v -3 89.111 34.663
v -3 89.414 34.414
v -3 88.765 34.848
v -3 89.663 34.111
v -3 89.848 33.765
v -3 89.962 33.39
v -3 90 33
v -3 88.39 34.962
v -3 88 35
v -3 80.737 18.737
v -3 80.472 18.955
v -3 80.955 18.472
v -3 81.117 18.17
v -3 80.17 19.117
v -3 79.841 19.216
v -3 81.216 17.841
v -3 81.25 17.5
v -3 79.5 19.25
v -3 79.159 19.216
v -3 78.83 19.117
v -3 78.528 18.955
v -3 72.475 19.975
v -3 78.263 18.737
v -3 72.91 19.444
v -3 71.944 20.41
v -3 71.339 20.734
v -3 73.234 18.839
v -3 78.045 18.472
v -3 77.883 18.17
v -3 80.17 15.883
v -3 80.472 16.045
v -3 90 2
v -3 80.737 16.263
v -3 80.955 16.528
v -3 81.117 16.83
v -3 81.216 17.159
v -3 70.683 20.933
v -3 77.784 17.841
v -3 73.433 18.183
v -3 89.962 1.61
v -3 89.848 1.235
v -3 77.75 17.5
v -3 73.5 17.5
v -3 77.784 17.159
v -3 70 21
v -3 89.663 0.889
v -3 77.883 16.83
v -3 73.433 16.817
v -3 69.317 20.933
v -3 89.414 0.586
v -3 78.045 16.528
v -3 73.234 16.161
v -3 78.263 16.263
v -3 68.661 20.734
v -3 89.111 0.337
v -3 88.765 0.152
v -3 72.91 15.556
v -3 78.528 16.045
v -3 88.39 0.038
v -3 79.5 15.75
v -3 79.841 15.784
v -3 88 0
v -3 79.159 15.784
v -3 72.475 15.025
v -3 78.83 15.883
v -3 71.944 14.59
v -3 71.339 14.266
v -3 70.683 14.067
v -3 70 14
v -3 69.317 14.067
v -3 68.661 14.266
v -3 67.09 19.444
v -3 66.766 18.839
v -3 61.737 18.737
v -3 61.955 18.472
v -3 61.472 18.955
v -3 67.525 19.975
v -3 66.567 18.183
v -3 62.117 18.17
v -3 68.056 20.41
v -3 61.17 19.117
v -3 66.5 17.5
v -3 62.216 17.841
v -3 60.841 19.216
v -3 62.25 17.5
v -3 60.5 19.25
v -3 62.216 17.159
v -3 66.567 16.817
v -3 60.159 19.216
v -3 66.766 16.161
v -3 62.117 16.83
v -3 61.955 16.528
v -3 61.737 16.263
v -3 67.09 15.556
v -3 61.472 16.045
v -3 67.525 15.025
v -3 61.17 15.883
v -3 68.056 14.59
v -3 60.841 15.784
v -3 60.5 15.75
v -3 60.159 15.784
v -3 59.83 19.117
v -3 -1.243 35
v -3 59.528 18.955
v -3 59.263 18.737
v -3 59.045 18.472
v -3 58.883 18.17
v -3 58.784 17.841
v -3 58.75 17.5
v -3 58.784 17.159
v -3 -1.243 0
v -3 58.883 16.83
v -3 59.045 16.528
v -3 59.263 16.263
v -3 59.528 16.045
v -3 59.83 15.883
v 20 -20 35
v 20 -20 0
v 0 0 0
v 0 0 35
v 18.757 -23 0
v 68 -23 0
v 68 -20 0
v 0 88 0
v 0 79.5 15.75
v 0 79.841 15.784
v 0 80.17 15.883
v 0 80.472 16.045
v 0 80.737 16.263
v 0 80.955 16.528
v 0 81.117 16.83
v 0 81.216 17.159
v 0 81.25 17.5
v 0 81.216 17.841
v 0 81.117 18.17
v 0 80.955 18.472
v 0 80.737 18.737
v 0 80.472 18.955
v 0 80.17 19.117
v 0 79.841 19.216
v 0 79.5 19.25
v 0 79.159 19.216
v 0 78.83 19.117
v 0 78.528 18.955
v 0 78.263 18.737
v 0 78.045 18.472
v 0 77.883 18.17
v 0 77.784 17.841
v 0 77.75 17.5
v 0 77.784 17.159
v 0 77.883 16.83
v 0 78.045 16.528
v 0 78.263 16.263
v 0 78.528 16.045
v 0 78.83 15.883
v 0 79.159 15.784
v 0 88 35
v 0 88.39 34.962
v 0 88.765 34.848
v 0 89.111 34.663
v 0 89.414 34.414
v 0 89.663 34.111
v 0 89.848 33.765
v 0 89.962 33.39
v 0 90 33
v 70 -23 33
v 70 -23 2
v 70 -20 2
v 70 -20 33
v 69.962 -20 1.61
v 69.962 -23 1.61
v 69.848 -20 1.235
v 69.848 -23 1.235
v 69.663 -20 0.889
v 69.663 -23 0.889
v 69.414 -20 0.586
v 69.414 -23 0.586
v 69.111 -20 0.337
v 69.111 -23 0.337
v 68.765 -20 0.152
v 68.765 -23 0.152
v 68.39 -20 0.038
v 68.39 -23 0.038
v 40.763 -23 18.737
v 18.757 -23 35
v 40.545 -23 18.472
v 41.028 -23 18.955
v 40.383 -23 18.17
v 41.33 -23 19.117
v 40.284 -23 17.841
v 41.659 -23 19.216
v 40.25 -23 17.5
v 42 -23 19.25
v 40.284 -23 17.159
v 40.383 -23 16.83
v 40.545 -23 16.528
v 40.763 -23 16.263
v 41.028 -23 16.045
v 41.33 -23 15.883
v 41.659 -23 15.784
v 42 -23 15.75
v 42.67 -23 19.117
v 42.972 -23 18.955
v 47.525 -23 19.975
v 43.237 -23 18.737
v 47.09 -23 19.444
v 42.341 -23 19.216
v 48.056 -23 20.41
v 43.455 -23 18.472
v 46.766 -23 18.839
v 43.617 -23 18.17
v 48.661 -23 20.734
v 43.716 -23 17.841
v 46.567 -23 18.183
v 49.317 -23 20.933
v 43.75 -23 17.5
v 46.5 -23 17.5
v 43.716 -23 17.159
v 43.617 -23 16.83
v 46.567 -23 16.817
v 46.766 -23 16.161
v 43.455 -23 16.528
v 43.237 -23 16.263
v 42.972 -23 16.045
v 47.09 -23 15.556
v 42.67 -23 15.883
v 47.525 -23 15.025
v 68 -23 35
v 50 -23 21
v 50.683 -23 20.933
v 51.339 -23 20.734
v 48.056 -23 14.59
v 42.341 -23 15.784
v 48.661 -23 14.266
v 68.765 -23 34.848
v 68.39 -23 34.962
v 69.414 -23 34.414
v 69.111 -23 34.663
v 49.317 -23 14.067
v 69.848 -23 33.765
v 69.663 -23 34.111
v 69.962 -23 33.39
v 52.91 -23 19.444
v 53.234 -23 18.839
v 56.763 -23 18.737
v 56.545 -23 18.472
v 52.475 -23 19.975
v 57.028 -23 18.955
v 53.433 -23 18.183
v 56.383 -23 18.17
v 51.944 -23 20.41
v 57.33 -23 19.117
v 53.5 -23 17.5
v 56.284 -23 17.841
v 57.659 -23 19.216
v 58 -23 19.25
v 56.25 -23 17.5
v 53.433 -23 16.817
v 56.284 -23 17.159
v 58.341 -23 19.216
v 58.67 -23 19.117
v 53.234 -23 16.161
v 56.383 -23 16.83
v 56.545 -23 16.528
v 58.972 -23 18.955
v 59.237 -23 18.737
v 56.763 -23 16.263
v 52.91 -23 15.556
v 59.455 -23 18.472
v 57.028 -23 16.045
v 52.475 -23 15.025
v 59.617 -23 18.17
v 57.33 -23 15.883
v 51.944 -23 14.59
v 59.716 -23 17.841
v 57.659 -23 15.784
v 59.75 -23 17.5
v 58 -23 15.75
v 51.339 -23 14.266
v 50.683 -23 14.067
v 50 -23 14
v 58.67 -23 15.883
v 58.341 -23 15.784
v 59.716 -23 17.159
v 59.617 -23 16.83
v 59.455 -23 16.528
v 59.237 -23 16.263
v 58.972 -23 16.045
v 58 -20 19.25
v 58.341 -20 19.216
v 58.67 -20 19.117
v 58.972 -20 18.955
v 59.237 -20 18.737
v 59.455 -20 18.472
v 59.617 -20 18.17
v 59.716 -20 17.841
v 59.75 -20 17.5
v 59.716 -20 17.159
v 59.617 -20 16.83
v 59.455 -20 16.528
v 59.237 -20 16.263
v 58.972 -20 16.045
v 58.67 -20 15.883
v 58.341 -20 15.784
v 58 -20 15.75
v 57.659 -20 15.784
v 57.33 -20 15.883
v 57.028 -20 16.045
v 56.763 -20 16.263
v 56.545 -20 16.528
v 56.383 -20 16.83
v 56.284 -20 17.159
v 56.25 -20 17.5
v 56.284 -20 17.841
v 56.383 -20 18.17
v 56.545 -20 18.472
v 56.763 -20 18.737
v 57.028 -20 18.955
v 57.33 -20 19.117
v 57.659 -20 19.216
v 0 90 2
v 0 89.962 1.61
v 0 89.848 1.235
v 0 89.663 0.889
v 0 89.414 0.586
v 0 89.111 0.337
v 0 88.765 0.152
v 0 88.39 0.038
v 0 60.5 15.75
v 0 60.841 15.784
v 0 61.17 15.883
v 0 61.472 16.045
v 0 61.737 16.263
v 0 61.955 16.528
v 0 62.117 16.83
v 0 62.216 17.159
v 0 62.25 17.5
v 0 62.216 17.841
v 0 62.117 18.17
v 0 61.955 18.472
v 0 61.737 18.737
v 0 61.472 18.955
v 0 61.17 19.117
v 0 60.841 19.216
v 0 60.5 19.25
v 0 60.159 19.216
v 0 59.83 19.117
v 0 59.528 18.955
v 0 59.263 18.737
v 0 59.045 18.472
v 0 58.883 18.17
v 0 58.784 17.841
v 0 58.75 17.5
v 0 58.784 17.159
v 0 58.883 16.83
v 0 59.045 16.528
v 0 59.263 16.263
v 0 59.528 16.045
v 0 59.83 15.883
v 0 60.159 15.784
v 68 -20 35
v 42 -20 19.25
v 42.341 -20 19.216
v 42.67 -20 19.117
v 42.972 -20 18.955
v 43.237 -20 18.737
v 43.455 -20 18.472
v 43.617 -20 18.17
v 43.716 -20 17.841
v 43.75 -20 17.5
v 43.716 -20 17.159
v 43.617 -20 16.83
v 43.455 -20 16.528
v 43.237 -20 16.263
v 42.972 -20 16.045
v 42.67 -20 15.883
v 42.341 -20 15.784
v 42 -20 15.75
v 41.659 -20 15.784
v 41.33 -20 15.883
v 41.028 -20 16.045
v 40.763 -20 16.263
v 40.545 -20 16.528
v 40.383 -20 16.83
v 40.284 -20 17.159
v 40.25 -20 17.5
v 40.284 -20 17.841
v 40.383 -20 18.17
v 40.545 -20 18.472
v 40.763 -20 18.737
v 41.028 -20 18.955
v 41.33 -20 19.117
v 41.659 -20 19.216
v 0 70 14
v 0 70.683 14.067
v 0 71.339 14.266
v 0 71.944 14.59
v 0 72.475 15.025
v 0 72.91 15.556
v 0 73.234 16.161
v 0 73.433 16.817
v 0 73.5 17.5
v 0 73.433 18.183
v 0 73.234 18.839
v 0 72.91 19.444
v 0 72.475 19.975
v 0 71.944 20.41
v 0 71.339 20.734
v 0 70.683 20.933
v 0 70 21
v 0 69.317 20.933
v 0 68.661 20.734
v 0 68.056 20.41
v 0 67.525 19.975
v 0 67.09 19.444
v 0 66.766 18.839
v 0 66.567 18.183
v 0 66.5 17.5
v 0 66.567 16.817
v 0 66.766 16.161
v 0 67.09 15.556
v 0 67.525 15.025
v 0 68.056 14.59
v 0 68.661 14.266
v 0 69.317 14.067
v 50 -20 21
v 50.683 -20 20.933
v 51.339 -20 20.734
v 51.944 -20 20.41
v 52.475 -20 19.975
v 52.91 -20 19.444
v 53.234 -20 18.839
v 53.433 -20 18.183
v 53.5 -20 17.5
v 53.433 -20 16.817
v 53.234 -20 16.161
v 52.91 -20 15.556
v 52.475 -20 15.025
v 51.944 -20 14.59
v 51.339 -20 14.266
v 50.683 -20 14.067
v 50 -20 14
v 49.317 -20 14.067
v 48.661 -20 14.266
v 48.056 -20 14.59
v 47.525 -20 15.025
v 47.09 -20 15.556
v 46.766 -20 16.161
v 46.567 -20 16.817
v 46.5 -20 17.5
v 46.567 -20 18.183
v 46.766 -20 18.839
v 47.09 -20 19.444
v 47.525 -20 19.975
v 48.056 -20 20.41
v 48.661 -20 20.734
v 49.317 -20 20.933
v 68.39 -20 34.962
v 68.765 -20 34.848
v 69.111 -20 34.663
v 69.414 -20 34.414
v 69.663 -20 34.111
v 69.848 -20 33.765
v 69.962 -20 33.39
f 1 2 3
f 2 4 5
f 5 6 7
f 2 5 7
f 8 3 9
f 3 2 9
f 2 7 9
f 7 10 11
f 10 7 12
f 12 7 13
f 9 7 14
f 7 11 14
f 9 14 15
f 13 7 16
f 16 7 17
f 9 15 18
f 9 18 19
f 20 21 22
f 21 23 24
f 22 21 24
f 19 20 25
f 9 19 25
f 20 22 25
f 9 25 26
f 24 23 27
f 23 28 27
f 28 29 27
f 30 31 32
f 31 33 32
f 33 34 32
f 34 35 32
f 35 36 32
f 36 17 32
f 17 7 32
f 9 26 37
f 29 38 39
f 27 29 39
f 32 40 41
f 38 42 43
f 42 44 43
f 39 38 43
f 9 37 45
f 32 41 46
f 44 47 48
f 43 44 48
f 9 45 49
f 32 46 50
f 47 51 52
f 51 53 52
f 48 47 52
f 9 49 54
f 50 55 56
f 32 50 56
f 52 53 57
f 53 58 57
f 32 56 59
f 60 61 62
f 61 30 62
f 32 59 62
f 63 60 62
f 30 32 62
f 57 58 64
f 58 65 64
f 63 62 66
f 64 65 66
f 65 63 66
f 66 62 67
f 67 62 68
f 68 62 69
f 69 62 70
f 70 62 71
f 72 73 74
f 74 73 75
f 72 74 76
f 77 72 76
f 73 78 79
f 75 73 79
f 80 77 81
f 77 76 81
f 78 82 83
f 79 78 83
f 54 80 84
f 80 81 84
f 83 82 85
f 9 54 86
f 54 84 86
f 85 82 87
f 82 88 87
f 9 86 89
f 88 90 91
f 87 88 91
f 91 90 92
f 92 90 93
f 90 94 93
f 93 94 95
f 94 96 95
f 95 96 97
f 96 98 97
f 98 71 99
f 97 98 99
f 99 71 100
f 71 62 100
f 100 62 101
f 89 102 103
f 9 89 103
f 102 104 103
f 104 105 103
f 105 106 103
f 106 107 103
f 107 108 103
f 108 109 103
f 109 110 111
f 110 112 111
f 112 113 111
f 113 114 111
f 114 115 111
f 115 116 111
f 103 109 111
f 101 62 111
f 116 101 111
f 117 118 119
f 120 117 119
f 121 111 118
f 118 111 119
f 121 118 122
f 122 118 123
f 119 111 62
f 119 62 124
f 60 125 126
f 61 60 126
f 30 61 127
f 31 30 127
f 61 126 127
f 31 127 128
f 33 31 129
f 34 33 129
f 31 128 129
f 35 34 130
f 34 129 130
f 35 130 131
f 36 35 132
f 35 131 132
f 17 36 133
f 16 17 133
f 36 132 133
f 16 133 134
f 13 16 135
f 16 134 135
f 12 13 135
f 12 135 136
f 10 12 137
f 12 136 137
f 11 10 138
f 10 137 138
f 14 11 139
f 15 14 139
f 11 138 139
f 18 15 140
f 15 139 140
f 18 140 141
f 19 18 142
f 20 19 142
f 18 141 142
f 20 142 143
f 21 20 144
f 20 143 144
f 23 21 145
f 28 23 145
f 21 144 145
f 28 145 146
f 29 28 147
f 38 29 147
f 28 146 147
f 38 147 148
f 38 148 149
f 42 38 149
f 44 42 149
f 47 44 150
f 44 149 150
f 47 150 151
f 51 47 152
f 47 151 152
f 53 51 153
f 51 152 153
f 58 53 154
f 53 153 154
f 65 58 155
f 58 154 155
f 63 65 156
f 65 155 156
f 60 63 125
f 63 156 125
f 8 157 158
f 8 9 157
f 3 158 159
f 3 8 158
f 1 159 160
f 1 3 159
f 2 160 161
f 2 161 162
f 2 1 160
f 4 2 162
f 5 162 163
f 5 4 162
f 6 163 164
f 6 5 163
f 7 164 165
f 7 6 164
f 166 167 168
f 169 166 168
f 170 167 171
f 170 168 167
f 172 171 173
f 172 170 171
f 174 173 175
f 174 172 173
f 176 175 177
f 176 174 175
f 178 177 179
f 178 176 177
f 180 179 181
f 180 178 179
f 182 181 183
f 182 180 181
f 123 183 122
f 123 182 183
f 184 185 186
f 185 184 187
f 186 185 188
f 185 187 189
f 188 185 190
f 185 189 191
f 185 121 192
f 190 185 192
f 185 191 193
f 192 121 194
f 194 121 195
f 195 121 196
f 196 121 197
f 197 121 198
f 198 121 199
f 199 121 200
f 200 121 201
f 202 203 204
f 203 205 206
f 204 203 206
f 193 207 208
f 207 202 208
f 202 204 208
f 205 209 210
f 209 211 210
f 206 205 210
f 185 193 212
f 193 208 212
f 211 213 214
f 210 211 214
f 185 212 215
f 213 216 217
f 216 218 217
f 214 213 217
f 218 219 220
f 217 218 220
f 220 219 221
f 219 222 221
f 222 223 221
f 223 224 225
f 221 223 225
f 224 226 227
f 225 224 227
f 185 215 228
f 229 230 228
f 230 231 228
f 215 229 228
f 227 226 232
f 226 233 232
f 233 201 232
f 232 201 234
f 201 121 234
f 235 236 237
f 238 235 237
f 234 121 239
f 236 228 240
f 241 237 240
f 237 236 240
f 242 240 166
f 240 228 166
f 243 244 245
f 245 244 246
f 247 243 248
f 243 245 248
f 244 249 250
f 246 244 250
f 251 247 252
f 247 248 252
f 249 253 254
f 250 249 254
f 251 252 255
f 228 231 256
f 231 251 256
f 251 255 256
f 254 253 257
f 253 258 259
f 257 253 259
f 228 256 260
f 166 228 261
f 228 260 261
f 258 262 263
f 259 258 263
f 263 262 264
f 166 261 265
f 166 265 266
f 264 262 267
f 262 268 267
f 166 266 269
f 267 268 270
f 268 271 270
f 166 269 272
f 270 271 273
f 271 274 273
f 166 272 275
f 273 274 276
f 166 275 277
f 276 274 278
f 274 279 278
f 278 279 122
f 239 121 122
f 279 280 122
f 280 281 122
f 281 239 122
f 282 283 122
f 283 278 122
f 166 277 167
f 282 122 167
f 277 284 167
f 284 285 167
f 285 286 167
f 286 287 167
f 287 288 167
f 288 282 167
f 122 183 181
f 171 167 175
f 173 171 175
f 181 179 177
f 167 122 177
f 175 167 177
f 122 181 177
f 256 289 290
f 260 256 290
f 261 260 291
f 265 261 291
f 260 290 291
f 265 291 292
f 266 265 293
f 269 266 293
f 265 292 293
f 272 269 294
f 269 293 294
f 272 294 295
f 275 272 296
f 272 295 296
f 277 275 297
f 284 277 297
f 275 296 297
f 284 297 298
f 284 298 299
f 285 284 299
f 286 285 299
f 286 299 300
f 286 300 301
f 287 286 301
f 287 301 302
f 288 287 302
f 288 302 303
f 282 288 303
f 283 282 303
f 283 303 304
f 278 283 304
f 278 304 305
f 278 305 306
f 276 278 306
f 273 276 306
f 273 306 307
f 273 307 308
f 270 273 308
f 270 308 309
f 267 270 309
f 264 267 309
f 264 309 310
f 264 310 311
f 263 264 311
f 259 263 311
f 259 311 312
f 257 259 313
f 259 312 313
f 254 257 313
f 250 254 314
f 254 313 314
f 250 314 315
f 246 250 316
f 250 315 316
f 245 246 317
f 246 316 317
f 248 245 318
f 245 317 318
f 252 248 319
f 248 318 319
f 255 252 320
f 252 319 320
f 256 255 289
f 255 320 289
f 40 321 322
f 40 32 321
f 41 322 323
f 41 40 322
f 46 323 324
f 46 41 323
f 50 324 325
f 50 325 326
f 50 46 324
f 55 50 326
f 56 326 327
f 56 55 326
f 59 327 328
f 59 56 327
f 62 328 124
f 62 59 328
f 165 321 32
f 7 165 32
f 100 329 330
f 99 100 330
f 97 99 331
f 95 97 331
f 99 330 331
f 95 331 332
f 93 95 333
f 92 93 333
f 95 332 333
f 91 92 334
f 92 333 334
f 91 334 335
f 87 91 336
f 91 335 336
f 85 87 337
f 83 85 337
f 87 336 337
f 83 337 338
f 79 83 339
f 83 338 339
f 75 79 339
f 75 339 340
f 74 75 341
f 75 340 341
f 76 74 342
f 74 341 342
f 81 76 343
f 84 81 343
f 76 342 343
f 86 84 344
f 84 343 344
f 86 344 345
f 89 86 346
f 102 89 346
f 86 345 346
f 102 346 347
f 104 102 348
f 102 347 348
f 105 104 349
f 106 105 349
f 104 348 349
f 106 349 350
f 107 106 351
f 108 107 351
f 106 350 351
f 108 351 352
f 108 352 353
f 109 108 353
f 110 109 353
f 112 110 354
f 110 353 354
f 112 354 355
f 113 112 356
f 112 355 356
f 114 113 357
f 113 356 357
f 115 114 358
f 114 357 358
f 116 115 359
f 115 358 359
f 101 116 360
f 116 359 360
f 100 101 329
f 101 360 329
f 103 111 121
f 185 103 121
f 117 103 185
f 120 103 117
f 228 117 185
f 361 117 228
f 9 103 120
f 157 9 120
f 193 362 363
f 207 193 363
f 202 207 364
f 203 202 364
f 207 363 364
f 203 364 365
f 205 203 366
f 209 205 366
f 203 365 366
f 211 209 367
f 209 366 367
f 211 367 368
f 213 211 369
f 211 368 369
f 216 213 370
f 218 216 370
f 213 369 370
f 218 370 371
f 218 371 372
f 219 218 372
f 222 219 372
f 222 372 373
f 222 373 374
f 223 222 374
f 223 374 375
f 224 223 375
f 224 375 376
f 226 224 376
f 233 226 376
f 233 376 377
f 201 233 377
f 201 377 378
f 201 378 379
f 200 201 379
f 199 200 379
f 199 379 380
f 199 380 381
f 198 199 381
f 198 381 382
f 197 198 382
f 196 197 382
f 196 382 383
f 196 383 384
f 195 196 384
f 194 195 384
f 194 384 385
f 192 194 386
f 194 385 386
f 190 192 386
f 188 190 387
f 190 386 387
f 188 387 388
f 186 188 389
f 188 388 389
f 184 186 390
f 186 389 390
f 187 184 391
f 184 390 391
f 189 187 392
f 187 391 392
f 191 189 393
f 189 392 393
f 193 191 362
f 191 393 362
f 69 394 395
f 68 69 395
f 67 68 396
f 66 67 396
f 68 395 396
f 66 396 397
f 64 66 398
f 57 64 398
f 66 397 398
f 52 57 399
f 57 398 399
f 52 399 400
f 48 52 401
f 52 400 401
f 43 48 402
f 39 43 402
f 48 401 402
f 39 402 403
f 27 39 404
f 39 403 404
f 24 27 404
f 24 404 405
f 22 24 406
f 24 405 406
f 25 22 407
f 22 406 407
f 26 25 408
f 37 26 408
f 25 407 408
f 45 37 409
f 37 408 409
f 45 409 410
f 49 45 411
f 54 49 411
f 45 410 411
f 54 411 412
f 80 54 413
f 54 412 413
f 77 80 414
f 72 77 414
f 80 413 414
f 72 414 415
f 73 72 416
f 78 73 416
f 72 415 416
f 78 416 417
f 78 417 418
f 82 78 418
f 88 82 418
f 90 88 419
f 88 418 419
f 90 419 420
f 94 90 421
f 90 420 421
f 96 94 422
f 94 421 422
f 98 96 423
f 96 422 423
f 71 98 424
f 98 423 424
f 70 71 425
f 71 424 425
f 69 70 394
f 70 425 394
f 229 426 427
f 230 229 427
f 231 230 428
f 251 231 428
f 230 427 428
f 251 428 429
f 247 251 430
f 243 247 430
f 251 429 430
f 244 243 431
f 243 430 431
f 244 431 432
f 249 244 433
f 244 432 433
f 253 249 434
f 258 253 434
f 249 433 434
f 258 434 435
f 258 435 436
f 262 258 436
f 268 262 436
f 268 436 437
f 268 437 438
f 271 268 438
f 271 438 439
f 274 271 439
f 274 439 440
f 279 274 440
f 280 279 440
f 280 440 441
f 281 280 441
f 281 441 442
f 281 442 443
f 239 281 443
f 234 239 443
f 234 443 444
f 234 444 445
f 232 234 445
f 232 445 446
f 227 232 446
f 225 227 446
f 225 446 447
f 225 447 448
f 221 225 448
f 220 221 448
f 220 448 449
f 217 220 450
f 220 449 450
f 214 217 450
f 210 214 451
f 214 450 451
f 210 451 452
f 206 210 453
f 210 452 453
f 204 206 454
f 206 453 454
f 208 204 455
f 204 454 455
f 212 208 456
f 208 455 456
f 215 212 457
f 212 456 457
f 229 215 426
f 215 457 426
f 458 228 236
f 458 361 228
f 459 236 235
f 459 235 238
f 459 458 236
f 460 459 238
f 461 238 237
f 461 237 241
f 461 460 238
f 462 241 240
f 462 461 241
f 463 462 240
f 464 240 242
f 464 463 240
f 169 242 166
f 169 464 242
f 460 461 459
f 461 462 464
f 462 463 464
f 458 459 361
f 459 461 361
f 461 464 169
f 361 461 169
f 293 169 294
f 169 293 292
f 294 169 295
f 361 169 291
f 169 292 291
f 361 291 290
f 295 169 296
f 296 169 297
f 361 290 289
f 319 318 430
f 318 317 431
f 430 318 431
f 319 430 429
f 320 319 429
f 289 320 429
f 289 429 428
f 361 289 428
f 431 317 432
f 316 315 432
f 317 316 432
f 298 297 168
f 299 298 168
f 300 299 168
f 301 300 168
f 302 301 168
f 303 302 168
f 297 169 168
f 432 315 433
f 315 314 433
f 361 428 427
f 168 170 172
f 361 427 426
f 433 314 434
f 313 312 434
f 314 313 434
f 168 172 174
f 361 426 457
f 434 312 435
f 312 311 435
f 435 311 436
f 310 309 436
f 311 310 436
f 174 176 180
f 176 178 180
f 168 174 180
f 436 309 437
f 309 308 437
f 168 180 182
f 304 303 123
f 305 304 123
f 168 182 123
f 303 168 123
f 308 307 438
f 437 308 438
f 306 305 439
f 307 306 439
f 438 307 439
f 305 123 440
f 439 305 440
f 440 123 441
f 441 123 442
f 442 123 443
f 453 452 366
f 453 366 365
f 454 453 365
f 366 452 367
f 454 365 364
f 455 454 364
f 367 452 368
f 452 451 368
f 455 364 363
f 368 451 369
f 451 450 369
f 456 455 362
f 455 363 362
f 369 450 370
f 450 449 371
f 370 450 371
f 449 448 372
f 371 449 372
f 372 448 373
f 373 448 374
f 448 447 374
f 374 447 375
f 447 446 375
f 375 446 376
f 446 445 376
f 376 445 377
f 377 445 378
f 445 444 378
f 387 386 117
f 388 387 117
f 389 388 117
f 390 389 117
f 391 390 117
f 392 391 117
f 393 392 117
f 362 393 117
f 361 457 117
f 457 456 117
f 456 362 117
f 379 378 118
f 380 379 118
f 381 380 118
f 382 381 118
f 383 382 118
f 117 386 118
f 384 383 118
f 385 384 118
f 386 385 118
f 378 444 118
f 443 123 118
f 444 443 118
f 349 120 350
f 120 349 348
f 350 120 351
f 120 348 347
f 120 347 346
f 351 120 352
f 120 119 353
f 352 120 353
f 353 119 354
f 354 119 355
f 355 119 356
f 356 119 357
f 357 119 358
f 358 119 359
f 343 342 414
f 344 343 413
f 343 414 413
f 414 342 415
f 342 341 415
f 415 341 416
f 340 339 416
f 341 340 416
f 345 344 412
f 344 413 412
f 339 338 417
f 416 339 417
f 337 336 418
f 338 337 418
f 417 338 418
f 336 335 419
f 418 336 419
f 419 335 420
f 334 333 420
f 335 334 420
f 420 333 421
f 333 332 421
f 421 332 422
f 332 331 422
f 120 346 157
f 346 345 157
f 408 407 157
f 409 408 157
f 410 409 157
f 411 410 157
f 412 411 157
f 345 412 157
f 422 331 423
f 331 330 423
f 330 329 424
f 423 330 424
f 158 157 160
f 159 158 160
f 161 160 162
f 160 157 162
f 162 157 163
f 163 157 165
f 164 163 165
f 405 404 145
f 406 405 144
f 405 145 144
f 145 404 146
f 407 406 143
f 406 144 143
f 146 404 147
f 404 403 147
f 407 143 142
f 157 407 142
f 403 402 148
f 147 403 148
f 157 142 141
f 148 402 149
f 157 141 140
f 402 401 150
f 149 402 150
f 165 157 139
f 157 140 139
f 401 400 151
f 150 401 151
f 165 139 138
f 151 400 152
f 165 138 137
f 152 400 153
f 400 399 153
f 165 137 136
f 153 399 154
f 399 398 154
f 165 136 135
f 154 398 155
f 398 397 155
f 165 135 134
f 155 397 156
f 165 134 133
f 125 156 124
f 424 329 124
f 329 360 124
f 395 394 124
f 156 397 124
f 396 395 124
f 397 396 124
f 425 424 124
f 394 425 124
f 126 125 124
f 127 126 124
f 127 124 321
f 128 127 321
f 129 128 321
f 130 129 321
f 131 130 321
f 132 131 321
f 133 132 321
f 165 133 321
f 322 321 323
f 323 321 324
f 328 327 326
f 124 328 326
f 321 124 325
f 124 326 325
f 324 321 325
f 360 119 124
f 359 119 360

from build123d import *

# Parameters (mm, degrees)
EXTRU_MINCE1_DEPTH      = 35
ESQUISSE2_R             = 1.75
ESQUISSE2_R_2           = 3.5
ENL_V_MAT_EXTRU_1_DEPTH = 3
CONG_3_R                = 2
CONG_4_R                = 2
CONG_5_R                = 2
CONG_6_R                = 2
ESQUISSE3_R             = 1.75
ESQUISSE3_R_2           = 3.5
ENL_V_MAT_EXTRU_2_DEPTH = 10


with BuildPart() as part:
    # Esquisse1 → Extru.-Mince1 (new body)
    with BuildSketch(Plane.XY):
        Polygon((70, -20), (20, -20), (0, 0), (0, 90), (-3, 90), (-3, -1.242640687), (18.757359313, -23), (70, -23), align=None)
    extrude(amount=EXTRU_MINCE1_DEPTH)

    # Esquisse2 → Enlèv. mat.-Extru.1 (cut)
    with BuildSketch(Plane(origin=(0, 0, 0), x_dir=(0, 0, -1), z_dir=(1, 0, 0))):
        with Locations((-17.5, 79.5)):
            Circle(ESQUISSE2_R)
        with Locations((-17.5, 60.5)):
            Circle(ESQUISSE2_R)
        with Locations((-17.5, 70)):
            Circle(ESQUISSE2_R_2)
    extrude(amount=-ENL_V_MAT_EXTRU_1_DEPTH, mode=Mode.SUBTRACT)

    # Congé3
    cong_3_edges = [part.edges().sort_by_distance(p)[0] for p in [
        (-1.5, 90, 35),
    ]]
    fillet(cong_3_edges, radius=CONG_3_R)

    # Congé4
    cong_4_edges = [part.edges().sort_by_distance(p)[0] for p in [
        (-1.5, 90, 0),
    ]]
    fillet(cong_4_edges, radius=CONG_4_R)

    # Congé5
    cong_5_edges = [part.edges().sort_by_distance(p)[0] for p in [
        (70, -21.5, 35),
    ]]
    fillet(cong_5_edges, radius=CONG_5_R)

    # Congé6
    cong_6_edges = [part.edges().sort_by_distance(p)[0] for p in [
        (70, -21.5, 0),
    ]]
    fillet(cong_6_edges, radius=CONG_6_R)

    # Esquisse3 → Enlèv. mat.-Extru.2 (cut)
    with BuildSketch(Plane(origin=(0, -20, 0), x_dir=(1, 0, 0), z_dir=(0, 1, 0))):
        with Locations(Location((58, -17.5, 0), (0, 0, 270))):
            Circle(ESQUISSE3_R)
        with Locations(Location((42, -17.5, 0), (0, 0, 270))):
            Circle(ESQUISSE3_R)
        with Locations(Location((50, -17.5, 0), (0, 0, 270))):
            Circle(ESQUISSE3_R_2)
    extrude(amount=-ENL_V_MAT_EXTRU_2_DEPTH, mode=Mode.SUBTRACT)


solid = part.part
